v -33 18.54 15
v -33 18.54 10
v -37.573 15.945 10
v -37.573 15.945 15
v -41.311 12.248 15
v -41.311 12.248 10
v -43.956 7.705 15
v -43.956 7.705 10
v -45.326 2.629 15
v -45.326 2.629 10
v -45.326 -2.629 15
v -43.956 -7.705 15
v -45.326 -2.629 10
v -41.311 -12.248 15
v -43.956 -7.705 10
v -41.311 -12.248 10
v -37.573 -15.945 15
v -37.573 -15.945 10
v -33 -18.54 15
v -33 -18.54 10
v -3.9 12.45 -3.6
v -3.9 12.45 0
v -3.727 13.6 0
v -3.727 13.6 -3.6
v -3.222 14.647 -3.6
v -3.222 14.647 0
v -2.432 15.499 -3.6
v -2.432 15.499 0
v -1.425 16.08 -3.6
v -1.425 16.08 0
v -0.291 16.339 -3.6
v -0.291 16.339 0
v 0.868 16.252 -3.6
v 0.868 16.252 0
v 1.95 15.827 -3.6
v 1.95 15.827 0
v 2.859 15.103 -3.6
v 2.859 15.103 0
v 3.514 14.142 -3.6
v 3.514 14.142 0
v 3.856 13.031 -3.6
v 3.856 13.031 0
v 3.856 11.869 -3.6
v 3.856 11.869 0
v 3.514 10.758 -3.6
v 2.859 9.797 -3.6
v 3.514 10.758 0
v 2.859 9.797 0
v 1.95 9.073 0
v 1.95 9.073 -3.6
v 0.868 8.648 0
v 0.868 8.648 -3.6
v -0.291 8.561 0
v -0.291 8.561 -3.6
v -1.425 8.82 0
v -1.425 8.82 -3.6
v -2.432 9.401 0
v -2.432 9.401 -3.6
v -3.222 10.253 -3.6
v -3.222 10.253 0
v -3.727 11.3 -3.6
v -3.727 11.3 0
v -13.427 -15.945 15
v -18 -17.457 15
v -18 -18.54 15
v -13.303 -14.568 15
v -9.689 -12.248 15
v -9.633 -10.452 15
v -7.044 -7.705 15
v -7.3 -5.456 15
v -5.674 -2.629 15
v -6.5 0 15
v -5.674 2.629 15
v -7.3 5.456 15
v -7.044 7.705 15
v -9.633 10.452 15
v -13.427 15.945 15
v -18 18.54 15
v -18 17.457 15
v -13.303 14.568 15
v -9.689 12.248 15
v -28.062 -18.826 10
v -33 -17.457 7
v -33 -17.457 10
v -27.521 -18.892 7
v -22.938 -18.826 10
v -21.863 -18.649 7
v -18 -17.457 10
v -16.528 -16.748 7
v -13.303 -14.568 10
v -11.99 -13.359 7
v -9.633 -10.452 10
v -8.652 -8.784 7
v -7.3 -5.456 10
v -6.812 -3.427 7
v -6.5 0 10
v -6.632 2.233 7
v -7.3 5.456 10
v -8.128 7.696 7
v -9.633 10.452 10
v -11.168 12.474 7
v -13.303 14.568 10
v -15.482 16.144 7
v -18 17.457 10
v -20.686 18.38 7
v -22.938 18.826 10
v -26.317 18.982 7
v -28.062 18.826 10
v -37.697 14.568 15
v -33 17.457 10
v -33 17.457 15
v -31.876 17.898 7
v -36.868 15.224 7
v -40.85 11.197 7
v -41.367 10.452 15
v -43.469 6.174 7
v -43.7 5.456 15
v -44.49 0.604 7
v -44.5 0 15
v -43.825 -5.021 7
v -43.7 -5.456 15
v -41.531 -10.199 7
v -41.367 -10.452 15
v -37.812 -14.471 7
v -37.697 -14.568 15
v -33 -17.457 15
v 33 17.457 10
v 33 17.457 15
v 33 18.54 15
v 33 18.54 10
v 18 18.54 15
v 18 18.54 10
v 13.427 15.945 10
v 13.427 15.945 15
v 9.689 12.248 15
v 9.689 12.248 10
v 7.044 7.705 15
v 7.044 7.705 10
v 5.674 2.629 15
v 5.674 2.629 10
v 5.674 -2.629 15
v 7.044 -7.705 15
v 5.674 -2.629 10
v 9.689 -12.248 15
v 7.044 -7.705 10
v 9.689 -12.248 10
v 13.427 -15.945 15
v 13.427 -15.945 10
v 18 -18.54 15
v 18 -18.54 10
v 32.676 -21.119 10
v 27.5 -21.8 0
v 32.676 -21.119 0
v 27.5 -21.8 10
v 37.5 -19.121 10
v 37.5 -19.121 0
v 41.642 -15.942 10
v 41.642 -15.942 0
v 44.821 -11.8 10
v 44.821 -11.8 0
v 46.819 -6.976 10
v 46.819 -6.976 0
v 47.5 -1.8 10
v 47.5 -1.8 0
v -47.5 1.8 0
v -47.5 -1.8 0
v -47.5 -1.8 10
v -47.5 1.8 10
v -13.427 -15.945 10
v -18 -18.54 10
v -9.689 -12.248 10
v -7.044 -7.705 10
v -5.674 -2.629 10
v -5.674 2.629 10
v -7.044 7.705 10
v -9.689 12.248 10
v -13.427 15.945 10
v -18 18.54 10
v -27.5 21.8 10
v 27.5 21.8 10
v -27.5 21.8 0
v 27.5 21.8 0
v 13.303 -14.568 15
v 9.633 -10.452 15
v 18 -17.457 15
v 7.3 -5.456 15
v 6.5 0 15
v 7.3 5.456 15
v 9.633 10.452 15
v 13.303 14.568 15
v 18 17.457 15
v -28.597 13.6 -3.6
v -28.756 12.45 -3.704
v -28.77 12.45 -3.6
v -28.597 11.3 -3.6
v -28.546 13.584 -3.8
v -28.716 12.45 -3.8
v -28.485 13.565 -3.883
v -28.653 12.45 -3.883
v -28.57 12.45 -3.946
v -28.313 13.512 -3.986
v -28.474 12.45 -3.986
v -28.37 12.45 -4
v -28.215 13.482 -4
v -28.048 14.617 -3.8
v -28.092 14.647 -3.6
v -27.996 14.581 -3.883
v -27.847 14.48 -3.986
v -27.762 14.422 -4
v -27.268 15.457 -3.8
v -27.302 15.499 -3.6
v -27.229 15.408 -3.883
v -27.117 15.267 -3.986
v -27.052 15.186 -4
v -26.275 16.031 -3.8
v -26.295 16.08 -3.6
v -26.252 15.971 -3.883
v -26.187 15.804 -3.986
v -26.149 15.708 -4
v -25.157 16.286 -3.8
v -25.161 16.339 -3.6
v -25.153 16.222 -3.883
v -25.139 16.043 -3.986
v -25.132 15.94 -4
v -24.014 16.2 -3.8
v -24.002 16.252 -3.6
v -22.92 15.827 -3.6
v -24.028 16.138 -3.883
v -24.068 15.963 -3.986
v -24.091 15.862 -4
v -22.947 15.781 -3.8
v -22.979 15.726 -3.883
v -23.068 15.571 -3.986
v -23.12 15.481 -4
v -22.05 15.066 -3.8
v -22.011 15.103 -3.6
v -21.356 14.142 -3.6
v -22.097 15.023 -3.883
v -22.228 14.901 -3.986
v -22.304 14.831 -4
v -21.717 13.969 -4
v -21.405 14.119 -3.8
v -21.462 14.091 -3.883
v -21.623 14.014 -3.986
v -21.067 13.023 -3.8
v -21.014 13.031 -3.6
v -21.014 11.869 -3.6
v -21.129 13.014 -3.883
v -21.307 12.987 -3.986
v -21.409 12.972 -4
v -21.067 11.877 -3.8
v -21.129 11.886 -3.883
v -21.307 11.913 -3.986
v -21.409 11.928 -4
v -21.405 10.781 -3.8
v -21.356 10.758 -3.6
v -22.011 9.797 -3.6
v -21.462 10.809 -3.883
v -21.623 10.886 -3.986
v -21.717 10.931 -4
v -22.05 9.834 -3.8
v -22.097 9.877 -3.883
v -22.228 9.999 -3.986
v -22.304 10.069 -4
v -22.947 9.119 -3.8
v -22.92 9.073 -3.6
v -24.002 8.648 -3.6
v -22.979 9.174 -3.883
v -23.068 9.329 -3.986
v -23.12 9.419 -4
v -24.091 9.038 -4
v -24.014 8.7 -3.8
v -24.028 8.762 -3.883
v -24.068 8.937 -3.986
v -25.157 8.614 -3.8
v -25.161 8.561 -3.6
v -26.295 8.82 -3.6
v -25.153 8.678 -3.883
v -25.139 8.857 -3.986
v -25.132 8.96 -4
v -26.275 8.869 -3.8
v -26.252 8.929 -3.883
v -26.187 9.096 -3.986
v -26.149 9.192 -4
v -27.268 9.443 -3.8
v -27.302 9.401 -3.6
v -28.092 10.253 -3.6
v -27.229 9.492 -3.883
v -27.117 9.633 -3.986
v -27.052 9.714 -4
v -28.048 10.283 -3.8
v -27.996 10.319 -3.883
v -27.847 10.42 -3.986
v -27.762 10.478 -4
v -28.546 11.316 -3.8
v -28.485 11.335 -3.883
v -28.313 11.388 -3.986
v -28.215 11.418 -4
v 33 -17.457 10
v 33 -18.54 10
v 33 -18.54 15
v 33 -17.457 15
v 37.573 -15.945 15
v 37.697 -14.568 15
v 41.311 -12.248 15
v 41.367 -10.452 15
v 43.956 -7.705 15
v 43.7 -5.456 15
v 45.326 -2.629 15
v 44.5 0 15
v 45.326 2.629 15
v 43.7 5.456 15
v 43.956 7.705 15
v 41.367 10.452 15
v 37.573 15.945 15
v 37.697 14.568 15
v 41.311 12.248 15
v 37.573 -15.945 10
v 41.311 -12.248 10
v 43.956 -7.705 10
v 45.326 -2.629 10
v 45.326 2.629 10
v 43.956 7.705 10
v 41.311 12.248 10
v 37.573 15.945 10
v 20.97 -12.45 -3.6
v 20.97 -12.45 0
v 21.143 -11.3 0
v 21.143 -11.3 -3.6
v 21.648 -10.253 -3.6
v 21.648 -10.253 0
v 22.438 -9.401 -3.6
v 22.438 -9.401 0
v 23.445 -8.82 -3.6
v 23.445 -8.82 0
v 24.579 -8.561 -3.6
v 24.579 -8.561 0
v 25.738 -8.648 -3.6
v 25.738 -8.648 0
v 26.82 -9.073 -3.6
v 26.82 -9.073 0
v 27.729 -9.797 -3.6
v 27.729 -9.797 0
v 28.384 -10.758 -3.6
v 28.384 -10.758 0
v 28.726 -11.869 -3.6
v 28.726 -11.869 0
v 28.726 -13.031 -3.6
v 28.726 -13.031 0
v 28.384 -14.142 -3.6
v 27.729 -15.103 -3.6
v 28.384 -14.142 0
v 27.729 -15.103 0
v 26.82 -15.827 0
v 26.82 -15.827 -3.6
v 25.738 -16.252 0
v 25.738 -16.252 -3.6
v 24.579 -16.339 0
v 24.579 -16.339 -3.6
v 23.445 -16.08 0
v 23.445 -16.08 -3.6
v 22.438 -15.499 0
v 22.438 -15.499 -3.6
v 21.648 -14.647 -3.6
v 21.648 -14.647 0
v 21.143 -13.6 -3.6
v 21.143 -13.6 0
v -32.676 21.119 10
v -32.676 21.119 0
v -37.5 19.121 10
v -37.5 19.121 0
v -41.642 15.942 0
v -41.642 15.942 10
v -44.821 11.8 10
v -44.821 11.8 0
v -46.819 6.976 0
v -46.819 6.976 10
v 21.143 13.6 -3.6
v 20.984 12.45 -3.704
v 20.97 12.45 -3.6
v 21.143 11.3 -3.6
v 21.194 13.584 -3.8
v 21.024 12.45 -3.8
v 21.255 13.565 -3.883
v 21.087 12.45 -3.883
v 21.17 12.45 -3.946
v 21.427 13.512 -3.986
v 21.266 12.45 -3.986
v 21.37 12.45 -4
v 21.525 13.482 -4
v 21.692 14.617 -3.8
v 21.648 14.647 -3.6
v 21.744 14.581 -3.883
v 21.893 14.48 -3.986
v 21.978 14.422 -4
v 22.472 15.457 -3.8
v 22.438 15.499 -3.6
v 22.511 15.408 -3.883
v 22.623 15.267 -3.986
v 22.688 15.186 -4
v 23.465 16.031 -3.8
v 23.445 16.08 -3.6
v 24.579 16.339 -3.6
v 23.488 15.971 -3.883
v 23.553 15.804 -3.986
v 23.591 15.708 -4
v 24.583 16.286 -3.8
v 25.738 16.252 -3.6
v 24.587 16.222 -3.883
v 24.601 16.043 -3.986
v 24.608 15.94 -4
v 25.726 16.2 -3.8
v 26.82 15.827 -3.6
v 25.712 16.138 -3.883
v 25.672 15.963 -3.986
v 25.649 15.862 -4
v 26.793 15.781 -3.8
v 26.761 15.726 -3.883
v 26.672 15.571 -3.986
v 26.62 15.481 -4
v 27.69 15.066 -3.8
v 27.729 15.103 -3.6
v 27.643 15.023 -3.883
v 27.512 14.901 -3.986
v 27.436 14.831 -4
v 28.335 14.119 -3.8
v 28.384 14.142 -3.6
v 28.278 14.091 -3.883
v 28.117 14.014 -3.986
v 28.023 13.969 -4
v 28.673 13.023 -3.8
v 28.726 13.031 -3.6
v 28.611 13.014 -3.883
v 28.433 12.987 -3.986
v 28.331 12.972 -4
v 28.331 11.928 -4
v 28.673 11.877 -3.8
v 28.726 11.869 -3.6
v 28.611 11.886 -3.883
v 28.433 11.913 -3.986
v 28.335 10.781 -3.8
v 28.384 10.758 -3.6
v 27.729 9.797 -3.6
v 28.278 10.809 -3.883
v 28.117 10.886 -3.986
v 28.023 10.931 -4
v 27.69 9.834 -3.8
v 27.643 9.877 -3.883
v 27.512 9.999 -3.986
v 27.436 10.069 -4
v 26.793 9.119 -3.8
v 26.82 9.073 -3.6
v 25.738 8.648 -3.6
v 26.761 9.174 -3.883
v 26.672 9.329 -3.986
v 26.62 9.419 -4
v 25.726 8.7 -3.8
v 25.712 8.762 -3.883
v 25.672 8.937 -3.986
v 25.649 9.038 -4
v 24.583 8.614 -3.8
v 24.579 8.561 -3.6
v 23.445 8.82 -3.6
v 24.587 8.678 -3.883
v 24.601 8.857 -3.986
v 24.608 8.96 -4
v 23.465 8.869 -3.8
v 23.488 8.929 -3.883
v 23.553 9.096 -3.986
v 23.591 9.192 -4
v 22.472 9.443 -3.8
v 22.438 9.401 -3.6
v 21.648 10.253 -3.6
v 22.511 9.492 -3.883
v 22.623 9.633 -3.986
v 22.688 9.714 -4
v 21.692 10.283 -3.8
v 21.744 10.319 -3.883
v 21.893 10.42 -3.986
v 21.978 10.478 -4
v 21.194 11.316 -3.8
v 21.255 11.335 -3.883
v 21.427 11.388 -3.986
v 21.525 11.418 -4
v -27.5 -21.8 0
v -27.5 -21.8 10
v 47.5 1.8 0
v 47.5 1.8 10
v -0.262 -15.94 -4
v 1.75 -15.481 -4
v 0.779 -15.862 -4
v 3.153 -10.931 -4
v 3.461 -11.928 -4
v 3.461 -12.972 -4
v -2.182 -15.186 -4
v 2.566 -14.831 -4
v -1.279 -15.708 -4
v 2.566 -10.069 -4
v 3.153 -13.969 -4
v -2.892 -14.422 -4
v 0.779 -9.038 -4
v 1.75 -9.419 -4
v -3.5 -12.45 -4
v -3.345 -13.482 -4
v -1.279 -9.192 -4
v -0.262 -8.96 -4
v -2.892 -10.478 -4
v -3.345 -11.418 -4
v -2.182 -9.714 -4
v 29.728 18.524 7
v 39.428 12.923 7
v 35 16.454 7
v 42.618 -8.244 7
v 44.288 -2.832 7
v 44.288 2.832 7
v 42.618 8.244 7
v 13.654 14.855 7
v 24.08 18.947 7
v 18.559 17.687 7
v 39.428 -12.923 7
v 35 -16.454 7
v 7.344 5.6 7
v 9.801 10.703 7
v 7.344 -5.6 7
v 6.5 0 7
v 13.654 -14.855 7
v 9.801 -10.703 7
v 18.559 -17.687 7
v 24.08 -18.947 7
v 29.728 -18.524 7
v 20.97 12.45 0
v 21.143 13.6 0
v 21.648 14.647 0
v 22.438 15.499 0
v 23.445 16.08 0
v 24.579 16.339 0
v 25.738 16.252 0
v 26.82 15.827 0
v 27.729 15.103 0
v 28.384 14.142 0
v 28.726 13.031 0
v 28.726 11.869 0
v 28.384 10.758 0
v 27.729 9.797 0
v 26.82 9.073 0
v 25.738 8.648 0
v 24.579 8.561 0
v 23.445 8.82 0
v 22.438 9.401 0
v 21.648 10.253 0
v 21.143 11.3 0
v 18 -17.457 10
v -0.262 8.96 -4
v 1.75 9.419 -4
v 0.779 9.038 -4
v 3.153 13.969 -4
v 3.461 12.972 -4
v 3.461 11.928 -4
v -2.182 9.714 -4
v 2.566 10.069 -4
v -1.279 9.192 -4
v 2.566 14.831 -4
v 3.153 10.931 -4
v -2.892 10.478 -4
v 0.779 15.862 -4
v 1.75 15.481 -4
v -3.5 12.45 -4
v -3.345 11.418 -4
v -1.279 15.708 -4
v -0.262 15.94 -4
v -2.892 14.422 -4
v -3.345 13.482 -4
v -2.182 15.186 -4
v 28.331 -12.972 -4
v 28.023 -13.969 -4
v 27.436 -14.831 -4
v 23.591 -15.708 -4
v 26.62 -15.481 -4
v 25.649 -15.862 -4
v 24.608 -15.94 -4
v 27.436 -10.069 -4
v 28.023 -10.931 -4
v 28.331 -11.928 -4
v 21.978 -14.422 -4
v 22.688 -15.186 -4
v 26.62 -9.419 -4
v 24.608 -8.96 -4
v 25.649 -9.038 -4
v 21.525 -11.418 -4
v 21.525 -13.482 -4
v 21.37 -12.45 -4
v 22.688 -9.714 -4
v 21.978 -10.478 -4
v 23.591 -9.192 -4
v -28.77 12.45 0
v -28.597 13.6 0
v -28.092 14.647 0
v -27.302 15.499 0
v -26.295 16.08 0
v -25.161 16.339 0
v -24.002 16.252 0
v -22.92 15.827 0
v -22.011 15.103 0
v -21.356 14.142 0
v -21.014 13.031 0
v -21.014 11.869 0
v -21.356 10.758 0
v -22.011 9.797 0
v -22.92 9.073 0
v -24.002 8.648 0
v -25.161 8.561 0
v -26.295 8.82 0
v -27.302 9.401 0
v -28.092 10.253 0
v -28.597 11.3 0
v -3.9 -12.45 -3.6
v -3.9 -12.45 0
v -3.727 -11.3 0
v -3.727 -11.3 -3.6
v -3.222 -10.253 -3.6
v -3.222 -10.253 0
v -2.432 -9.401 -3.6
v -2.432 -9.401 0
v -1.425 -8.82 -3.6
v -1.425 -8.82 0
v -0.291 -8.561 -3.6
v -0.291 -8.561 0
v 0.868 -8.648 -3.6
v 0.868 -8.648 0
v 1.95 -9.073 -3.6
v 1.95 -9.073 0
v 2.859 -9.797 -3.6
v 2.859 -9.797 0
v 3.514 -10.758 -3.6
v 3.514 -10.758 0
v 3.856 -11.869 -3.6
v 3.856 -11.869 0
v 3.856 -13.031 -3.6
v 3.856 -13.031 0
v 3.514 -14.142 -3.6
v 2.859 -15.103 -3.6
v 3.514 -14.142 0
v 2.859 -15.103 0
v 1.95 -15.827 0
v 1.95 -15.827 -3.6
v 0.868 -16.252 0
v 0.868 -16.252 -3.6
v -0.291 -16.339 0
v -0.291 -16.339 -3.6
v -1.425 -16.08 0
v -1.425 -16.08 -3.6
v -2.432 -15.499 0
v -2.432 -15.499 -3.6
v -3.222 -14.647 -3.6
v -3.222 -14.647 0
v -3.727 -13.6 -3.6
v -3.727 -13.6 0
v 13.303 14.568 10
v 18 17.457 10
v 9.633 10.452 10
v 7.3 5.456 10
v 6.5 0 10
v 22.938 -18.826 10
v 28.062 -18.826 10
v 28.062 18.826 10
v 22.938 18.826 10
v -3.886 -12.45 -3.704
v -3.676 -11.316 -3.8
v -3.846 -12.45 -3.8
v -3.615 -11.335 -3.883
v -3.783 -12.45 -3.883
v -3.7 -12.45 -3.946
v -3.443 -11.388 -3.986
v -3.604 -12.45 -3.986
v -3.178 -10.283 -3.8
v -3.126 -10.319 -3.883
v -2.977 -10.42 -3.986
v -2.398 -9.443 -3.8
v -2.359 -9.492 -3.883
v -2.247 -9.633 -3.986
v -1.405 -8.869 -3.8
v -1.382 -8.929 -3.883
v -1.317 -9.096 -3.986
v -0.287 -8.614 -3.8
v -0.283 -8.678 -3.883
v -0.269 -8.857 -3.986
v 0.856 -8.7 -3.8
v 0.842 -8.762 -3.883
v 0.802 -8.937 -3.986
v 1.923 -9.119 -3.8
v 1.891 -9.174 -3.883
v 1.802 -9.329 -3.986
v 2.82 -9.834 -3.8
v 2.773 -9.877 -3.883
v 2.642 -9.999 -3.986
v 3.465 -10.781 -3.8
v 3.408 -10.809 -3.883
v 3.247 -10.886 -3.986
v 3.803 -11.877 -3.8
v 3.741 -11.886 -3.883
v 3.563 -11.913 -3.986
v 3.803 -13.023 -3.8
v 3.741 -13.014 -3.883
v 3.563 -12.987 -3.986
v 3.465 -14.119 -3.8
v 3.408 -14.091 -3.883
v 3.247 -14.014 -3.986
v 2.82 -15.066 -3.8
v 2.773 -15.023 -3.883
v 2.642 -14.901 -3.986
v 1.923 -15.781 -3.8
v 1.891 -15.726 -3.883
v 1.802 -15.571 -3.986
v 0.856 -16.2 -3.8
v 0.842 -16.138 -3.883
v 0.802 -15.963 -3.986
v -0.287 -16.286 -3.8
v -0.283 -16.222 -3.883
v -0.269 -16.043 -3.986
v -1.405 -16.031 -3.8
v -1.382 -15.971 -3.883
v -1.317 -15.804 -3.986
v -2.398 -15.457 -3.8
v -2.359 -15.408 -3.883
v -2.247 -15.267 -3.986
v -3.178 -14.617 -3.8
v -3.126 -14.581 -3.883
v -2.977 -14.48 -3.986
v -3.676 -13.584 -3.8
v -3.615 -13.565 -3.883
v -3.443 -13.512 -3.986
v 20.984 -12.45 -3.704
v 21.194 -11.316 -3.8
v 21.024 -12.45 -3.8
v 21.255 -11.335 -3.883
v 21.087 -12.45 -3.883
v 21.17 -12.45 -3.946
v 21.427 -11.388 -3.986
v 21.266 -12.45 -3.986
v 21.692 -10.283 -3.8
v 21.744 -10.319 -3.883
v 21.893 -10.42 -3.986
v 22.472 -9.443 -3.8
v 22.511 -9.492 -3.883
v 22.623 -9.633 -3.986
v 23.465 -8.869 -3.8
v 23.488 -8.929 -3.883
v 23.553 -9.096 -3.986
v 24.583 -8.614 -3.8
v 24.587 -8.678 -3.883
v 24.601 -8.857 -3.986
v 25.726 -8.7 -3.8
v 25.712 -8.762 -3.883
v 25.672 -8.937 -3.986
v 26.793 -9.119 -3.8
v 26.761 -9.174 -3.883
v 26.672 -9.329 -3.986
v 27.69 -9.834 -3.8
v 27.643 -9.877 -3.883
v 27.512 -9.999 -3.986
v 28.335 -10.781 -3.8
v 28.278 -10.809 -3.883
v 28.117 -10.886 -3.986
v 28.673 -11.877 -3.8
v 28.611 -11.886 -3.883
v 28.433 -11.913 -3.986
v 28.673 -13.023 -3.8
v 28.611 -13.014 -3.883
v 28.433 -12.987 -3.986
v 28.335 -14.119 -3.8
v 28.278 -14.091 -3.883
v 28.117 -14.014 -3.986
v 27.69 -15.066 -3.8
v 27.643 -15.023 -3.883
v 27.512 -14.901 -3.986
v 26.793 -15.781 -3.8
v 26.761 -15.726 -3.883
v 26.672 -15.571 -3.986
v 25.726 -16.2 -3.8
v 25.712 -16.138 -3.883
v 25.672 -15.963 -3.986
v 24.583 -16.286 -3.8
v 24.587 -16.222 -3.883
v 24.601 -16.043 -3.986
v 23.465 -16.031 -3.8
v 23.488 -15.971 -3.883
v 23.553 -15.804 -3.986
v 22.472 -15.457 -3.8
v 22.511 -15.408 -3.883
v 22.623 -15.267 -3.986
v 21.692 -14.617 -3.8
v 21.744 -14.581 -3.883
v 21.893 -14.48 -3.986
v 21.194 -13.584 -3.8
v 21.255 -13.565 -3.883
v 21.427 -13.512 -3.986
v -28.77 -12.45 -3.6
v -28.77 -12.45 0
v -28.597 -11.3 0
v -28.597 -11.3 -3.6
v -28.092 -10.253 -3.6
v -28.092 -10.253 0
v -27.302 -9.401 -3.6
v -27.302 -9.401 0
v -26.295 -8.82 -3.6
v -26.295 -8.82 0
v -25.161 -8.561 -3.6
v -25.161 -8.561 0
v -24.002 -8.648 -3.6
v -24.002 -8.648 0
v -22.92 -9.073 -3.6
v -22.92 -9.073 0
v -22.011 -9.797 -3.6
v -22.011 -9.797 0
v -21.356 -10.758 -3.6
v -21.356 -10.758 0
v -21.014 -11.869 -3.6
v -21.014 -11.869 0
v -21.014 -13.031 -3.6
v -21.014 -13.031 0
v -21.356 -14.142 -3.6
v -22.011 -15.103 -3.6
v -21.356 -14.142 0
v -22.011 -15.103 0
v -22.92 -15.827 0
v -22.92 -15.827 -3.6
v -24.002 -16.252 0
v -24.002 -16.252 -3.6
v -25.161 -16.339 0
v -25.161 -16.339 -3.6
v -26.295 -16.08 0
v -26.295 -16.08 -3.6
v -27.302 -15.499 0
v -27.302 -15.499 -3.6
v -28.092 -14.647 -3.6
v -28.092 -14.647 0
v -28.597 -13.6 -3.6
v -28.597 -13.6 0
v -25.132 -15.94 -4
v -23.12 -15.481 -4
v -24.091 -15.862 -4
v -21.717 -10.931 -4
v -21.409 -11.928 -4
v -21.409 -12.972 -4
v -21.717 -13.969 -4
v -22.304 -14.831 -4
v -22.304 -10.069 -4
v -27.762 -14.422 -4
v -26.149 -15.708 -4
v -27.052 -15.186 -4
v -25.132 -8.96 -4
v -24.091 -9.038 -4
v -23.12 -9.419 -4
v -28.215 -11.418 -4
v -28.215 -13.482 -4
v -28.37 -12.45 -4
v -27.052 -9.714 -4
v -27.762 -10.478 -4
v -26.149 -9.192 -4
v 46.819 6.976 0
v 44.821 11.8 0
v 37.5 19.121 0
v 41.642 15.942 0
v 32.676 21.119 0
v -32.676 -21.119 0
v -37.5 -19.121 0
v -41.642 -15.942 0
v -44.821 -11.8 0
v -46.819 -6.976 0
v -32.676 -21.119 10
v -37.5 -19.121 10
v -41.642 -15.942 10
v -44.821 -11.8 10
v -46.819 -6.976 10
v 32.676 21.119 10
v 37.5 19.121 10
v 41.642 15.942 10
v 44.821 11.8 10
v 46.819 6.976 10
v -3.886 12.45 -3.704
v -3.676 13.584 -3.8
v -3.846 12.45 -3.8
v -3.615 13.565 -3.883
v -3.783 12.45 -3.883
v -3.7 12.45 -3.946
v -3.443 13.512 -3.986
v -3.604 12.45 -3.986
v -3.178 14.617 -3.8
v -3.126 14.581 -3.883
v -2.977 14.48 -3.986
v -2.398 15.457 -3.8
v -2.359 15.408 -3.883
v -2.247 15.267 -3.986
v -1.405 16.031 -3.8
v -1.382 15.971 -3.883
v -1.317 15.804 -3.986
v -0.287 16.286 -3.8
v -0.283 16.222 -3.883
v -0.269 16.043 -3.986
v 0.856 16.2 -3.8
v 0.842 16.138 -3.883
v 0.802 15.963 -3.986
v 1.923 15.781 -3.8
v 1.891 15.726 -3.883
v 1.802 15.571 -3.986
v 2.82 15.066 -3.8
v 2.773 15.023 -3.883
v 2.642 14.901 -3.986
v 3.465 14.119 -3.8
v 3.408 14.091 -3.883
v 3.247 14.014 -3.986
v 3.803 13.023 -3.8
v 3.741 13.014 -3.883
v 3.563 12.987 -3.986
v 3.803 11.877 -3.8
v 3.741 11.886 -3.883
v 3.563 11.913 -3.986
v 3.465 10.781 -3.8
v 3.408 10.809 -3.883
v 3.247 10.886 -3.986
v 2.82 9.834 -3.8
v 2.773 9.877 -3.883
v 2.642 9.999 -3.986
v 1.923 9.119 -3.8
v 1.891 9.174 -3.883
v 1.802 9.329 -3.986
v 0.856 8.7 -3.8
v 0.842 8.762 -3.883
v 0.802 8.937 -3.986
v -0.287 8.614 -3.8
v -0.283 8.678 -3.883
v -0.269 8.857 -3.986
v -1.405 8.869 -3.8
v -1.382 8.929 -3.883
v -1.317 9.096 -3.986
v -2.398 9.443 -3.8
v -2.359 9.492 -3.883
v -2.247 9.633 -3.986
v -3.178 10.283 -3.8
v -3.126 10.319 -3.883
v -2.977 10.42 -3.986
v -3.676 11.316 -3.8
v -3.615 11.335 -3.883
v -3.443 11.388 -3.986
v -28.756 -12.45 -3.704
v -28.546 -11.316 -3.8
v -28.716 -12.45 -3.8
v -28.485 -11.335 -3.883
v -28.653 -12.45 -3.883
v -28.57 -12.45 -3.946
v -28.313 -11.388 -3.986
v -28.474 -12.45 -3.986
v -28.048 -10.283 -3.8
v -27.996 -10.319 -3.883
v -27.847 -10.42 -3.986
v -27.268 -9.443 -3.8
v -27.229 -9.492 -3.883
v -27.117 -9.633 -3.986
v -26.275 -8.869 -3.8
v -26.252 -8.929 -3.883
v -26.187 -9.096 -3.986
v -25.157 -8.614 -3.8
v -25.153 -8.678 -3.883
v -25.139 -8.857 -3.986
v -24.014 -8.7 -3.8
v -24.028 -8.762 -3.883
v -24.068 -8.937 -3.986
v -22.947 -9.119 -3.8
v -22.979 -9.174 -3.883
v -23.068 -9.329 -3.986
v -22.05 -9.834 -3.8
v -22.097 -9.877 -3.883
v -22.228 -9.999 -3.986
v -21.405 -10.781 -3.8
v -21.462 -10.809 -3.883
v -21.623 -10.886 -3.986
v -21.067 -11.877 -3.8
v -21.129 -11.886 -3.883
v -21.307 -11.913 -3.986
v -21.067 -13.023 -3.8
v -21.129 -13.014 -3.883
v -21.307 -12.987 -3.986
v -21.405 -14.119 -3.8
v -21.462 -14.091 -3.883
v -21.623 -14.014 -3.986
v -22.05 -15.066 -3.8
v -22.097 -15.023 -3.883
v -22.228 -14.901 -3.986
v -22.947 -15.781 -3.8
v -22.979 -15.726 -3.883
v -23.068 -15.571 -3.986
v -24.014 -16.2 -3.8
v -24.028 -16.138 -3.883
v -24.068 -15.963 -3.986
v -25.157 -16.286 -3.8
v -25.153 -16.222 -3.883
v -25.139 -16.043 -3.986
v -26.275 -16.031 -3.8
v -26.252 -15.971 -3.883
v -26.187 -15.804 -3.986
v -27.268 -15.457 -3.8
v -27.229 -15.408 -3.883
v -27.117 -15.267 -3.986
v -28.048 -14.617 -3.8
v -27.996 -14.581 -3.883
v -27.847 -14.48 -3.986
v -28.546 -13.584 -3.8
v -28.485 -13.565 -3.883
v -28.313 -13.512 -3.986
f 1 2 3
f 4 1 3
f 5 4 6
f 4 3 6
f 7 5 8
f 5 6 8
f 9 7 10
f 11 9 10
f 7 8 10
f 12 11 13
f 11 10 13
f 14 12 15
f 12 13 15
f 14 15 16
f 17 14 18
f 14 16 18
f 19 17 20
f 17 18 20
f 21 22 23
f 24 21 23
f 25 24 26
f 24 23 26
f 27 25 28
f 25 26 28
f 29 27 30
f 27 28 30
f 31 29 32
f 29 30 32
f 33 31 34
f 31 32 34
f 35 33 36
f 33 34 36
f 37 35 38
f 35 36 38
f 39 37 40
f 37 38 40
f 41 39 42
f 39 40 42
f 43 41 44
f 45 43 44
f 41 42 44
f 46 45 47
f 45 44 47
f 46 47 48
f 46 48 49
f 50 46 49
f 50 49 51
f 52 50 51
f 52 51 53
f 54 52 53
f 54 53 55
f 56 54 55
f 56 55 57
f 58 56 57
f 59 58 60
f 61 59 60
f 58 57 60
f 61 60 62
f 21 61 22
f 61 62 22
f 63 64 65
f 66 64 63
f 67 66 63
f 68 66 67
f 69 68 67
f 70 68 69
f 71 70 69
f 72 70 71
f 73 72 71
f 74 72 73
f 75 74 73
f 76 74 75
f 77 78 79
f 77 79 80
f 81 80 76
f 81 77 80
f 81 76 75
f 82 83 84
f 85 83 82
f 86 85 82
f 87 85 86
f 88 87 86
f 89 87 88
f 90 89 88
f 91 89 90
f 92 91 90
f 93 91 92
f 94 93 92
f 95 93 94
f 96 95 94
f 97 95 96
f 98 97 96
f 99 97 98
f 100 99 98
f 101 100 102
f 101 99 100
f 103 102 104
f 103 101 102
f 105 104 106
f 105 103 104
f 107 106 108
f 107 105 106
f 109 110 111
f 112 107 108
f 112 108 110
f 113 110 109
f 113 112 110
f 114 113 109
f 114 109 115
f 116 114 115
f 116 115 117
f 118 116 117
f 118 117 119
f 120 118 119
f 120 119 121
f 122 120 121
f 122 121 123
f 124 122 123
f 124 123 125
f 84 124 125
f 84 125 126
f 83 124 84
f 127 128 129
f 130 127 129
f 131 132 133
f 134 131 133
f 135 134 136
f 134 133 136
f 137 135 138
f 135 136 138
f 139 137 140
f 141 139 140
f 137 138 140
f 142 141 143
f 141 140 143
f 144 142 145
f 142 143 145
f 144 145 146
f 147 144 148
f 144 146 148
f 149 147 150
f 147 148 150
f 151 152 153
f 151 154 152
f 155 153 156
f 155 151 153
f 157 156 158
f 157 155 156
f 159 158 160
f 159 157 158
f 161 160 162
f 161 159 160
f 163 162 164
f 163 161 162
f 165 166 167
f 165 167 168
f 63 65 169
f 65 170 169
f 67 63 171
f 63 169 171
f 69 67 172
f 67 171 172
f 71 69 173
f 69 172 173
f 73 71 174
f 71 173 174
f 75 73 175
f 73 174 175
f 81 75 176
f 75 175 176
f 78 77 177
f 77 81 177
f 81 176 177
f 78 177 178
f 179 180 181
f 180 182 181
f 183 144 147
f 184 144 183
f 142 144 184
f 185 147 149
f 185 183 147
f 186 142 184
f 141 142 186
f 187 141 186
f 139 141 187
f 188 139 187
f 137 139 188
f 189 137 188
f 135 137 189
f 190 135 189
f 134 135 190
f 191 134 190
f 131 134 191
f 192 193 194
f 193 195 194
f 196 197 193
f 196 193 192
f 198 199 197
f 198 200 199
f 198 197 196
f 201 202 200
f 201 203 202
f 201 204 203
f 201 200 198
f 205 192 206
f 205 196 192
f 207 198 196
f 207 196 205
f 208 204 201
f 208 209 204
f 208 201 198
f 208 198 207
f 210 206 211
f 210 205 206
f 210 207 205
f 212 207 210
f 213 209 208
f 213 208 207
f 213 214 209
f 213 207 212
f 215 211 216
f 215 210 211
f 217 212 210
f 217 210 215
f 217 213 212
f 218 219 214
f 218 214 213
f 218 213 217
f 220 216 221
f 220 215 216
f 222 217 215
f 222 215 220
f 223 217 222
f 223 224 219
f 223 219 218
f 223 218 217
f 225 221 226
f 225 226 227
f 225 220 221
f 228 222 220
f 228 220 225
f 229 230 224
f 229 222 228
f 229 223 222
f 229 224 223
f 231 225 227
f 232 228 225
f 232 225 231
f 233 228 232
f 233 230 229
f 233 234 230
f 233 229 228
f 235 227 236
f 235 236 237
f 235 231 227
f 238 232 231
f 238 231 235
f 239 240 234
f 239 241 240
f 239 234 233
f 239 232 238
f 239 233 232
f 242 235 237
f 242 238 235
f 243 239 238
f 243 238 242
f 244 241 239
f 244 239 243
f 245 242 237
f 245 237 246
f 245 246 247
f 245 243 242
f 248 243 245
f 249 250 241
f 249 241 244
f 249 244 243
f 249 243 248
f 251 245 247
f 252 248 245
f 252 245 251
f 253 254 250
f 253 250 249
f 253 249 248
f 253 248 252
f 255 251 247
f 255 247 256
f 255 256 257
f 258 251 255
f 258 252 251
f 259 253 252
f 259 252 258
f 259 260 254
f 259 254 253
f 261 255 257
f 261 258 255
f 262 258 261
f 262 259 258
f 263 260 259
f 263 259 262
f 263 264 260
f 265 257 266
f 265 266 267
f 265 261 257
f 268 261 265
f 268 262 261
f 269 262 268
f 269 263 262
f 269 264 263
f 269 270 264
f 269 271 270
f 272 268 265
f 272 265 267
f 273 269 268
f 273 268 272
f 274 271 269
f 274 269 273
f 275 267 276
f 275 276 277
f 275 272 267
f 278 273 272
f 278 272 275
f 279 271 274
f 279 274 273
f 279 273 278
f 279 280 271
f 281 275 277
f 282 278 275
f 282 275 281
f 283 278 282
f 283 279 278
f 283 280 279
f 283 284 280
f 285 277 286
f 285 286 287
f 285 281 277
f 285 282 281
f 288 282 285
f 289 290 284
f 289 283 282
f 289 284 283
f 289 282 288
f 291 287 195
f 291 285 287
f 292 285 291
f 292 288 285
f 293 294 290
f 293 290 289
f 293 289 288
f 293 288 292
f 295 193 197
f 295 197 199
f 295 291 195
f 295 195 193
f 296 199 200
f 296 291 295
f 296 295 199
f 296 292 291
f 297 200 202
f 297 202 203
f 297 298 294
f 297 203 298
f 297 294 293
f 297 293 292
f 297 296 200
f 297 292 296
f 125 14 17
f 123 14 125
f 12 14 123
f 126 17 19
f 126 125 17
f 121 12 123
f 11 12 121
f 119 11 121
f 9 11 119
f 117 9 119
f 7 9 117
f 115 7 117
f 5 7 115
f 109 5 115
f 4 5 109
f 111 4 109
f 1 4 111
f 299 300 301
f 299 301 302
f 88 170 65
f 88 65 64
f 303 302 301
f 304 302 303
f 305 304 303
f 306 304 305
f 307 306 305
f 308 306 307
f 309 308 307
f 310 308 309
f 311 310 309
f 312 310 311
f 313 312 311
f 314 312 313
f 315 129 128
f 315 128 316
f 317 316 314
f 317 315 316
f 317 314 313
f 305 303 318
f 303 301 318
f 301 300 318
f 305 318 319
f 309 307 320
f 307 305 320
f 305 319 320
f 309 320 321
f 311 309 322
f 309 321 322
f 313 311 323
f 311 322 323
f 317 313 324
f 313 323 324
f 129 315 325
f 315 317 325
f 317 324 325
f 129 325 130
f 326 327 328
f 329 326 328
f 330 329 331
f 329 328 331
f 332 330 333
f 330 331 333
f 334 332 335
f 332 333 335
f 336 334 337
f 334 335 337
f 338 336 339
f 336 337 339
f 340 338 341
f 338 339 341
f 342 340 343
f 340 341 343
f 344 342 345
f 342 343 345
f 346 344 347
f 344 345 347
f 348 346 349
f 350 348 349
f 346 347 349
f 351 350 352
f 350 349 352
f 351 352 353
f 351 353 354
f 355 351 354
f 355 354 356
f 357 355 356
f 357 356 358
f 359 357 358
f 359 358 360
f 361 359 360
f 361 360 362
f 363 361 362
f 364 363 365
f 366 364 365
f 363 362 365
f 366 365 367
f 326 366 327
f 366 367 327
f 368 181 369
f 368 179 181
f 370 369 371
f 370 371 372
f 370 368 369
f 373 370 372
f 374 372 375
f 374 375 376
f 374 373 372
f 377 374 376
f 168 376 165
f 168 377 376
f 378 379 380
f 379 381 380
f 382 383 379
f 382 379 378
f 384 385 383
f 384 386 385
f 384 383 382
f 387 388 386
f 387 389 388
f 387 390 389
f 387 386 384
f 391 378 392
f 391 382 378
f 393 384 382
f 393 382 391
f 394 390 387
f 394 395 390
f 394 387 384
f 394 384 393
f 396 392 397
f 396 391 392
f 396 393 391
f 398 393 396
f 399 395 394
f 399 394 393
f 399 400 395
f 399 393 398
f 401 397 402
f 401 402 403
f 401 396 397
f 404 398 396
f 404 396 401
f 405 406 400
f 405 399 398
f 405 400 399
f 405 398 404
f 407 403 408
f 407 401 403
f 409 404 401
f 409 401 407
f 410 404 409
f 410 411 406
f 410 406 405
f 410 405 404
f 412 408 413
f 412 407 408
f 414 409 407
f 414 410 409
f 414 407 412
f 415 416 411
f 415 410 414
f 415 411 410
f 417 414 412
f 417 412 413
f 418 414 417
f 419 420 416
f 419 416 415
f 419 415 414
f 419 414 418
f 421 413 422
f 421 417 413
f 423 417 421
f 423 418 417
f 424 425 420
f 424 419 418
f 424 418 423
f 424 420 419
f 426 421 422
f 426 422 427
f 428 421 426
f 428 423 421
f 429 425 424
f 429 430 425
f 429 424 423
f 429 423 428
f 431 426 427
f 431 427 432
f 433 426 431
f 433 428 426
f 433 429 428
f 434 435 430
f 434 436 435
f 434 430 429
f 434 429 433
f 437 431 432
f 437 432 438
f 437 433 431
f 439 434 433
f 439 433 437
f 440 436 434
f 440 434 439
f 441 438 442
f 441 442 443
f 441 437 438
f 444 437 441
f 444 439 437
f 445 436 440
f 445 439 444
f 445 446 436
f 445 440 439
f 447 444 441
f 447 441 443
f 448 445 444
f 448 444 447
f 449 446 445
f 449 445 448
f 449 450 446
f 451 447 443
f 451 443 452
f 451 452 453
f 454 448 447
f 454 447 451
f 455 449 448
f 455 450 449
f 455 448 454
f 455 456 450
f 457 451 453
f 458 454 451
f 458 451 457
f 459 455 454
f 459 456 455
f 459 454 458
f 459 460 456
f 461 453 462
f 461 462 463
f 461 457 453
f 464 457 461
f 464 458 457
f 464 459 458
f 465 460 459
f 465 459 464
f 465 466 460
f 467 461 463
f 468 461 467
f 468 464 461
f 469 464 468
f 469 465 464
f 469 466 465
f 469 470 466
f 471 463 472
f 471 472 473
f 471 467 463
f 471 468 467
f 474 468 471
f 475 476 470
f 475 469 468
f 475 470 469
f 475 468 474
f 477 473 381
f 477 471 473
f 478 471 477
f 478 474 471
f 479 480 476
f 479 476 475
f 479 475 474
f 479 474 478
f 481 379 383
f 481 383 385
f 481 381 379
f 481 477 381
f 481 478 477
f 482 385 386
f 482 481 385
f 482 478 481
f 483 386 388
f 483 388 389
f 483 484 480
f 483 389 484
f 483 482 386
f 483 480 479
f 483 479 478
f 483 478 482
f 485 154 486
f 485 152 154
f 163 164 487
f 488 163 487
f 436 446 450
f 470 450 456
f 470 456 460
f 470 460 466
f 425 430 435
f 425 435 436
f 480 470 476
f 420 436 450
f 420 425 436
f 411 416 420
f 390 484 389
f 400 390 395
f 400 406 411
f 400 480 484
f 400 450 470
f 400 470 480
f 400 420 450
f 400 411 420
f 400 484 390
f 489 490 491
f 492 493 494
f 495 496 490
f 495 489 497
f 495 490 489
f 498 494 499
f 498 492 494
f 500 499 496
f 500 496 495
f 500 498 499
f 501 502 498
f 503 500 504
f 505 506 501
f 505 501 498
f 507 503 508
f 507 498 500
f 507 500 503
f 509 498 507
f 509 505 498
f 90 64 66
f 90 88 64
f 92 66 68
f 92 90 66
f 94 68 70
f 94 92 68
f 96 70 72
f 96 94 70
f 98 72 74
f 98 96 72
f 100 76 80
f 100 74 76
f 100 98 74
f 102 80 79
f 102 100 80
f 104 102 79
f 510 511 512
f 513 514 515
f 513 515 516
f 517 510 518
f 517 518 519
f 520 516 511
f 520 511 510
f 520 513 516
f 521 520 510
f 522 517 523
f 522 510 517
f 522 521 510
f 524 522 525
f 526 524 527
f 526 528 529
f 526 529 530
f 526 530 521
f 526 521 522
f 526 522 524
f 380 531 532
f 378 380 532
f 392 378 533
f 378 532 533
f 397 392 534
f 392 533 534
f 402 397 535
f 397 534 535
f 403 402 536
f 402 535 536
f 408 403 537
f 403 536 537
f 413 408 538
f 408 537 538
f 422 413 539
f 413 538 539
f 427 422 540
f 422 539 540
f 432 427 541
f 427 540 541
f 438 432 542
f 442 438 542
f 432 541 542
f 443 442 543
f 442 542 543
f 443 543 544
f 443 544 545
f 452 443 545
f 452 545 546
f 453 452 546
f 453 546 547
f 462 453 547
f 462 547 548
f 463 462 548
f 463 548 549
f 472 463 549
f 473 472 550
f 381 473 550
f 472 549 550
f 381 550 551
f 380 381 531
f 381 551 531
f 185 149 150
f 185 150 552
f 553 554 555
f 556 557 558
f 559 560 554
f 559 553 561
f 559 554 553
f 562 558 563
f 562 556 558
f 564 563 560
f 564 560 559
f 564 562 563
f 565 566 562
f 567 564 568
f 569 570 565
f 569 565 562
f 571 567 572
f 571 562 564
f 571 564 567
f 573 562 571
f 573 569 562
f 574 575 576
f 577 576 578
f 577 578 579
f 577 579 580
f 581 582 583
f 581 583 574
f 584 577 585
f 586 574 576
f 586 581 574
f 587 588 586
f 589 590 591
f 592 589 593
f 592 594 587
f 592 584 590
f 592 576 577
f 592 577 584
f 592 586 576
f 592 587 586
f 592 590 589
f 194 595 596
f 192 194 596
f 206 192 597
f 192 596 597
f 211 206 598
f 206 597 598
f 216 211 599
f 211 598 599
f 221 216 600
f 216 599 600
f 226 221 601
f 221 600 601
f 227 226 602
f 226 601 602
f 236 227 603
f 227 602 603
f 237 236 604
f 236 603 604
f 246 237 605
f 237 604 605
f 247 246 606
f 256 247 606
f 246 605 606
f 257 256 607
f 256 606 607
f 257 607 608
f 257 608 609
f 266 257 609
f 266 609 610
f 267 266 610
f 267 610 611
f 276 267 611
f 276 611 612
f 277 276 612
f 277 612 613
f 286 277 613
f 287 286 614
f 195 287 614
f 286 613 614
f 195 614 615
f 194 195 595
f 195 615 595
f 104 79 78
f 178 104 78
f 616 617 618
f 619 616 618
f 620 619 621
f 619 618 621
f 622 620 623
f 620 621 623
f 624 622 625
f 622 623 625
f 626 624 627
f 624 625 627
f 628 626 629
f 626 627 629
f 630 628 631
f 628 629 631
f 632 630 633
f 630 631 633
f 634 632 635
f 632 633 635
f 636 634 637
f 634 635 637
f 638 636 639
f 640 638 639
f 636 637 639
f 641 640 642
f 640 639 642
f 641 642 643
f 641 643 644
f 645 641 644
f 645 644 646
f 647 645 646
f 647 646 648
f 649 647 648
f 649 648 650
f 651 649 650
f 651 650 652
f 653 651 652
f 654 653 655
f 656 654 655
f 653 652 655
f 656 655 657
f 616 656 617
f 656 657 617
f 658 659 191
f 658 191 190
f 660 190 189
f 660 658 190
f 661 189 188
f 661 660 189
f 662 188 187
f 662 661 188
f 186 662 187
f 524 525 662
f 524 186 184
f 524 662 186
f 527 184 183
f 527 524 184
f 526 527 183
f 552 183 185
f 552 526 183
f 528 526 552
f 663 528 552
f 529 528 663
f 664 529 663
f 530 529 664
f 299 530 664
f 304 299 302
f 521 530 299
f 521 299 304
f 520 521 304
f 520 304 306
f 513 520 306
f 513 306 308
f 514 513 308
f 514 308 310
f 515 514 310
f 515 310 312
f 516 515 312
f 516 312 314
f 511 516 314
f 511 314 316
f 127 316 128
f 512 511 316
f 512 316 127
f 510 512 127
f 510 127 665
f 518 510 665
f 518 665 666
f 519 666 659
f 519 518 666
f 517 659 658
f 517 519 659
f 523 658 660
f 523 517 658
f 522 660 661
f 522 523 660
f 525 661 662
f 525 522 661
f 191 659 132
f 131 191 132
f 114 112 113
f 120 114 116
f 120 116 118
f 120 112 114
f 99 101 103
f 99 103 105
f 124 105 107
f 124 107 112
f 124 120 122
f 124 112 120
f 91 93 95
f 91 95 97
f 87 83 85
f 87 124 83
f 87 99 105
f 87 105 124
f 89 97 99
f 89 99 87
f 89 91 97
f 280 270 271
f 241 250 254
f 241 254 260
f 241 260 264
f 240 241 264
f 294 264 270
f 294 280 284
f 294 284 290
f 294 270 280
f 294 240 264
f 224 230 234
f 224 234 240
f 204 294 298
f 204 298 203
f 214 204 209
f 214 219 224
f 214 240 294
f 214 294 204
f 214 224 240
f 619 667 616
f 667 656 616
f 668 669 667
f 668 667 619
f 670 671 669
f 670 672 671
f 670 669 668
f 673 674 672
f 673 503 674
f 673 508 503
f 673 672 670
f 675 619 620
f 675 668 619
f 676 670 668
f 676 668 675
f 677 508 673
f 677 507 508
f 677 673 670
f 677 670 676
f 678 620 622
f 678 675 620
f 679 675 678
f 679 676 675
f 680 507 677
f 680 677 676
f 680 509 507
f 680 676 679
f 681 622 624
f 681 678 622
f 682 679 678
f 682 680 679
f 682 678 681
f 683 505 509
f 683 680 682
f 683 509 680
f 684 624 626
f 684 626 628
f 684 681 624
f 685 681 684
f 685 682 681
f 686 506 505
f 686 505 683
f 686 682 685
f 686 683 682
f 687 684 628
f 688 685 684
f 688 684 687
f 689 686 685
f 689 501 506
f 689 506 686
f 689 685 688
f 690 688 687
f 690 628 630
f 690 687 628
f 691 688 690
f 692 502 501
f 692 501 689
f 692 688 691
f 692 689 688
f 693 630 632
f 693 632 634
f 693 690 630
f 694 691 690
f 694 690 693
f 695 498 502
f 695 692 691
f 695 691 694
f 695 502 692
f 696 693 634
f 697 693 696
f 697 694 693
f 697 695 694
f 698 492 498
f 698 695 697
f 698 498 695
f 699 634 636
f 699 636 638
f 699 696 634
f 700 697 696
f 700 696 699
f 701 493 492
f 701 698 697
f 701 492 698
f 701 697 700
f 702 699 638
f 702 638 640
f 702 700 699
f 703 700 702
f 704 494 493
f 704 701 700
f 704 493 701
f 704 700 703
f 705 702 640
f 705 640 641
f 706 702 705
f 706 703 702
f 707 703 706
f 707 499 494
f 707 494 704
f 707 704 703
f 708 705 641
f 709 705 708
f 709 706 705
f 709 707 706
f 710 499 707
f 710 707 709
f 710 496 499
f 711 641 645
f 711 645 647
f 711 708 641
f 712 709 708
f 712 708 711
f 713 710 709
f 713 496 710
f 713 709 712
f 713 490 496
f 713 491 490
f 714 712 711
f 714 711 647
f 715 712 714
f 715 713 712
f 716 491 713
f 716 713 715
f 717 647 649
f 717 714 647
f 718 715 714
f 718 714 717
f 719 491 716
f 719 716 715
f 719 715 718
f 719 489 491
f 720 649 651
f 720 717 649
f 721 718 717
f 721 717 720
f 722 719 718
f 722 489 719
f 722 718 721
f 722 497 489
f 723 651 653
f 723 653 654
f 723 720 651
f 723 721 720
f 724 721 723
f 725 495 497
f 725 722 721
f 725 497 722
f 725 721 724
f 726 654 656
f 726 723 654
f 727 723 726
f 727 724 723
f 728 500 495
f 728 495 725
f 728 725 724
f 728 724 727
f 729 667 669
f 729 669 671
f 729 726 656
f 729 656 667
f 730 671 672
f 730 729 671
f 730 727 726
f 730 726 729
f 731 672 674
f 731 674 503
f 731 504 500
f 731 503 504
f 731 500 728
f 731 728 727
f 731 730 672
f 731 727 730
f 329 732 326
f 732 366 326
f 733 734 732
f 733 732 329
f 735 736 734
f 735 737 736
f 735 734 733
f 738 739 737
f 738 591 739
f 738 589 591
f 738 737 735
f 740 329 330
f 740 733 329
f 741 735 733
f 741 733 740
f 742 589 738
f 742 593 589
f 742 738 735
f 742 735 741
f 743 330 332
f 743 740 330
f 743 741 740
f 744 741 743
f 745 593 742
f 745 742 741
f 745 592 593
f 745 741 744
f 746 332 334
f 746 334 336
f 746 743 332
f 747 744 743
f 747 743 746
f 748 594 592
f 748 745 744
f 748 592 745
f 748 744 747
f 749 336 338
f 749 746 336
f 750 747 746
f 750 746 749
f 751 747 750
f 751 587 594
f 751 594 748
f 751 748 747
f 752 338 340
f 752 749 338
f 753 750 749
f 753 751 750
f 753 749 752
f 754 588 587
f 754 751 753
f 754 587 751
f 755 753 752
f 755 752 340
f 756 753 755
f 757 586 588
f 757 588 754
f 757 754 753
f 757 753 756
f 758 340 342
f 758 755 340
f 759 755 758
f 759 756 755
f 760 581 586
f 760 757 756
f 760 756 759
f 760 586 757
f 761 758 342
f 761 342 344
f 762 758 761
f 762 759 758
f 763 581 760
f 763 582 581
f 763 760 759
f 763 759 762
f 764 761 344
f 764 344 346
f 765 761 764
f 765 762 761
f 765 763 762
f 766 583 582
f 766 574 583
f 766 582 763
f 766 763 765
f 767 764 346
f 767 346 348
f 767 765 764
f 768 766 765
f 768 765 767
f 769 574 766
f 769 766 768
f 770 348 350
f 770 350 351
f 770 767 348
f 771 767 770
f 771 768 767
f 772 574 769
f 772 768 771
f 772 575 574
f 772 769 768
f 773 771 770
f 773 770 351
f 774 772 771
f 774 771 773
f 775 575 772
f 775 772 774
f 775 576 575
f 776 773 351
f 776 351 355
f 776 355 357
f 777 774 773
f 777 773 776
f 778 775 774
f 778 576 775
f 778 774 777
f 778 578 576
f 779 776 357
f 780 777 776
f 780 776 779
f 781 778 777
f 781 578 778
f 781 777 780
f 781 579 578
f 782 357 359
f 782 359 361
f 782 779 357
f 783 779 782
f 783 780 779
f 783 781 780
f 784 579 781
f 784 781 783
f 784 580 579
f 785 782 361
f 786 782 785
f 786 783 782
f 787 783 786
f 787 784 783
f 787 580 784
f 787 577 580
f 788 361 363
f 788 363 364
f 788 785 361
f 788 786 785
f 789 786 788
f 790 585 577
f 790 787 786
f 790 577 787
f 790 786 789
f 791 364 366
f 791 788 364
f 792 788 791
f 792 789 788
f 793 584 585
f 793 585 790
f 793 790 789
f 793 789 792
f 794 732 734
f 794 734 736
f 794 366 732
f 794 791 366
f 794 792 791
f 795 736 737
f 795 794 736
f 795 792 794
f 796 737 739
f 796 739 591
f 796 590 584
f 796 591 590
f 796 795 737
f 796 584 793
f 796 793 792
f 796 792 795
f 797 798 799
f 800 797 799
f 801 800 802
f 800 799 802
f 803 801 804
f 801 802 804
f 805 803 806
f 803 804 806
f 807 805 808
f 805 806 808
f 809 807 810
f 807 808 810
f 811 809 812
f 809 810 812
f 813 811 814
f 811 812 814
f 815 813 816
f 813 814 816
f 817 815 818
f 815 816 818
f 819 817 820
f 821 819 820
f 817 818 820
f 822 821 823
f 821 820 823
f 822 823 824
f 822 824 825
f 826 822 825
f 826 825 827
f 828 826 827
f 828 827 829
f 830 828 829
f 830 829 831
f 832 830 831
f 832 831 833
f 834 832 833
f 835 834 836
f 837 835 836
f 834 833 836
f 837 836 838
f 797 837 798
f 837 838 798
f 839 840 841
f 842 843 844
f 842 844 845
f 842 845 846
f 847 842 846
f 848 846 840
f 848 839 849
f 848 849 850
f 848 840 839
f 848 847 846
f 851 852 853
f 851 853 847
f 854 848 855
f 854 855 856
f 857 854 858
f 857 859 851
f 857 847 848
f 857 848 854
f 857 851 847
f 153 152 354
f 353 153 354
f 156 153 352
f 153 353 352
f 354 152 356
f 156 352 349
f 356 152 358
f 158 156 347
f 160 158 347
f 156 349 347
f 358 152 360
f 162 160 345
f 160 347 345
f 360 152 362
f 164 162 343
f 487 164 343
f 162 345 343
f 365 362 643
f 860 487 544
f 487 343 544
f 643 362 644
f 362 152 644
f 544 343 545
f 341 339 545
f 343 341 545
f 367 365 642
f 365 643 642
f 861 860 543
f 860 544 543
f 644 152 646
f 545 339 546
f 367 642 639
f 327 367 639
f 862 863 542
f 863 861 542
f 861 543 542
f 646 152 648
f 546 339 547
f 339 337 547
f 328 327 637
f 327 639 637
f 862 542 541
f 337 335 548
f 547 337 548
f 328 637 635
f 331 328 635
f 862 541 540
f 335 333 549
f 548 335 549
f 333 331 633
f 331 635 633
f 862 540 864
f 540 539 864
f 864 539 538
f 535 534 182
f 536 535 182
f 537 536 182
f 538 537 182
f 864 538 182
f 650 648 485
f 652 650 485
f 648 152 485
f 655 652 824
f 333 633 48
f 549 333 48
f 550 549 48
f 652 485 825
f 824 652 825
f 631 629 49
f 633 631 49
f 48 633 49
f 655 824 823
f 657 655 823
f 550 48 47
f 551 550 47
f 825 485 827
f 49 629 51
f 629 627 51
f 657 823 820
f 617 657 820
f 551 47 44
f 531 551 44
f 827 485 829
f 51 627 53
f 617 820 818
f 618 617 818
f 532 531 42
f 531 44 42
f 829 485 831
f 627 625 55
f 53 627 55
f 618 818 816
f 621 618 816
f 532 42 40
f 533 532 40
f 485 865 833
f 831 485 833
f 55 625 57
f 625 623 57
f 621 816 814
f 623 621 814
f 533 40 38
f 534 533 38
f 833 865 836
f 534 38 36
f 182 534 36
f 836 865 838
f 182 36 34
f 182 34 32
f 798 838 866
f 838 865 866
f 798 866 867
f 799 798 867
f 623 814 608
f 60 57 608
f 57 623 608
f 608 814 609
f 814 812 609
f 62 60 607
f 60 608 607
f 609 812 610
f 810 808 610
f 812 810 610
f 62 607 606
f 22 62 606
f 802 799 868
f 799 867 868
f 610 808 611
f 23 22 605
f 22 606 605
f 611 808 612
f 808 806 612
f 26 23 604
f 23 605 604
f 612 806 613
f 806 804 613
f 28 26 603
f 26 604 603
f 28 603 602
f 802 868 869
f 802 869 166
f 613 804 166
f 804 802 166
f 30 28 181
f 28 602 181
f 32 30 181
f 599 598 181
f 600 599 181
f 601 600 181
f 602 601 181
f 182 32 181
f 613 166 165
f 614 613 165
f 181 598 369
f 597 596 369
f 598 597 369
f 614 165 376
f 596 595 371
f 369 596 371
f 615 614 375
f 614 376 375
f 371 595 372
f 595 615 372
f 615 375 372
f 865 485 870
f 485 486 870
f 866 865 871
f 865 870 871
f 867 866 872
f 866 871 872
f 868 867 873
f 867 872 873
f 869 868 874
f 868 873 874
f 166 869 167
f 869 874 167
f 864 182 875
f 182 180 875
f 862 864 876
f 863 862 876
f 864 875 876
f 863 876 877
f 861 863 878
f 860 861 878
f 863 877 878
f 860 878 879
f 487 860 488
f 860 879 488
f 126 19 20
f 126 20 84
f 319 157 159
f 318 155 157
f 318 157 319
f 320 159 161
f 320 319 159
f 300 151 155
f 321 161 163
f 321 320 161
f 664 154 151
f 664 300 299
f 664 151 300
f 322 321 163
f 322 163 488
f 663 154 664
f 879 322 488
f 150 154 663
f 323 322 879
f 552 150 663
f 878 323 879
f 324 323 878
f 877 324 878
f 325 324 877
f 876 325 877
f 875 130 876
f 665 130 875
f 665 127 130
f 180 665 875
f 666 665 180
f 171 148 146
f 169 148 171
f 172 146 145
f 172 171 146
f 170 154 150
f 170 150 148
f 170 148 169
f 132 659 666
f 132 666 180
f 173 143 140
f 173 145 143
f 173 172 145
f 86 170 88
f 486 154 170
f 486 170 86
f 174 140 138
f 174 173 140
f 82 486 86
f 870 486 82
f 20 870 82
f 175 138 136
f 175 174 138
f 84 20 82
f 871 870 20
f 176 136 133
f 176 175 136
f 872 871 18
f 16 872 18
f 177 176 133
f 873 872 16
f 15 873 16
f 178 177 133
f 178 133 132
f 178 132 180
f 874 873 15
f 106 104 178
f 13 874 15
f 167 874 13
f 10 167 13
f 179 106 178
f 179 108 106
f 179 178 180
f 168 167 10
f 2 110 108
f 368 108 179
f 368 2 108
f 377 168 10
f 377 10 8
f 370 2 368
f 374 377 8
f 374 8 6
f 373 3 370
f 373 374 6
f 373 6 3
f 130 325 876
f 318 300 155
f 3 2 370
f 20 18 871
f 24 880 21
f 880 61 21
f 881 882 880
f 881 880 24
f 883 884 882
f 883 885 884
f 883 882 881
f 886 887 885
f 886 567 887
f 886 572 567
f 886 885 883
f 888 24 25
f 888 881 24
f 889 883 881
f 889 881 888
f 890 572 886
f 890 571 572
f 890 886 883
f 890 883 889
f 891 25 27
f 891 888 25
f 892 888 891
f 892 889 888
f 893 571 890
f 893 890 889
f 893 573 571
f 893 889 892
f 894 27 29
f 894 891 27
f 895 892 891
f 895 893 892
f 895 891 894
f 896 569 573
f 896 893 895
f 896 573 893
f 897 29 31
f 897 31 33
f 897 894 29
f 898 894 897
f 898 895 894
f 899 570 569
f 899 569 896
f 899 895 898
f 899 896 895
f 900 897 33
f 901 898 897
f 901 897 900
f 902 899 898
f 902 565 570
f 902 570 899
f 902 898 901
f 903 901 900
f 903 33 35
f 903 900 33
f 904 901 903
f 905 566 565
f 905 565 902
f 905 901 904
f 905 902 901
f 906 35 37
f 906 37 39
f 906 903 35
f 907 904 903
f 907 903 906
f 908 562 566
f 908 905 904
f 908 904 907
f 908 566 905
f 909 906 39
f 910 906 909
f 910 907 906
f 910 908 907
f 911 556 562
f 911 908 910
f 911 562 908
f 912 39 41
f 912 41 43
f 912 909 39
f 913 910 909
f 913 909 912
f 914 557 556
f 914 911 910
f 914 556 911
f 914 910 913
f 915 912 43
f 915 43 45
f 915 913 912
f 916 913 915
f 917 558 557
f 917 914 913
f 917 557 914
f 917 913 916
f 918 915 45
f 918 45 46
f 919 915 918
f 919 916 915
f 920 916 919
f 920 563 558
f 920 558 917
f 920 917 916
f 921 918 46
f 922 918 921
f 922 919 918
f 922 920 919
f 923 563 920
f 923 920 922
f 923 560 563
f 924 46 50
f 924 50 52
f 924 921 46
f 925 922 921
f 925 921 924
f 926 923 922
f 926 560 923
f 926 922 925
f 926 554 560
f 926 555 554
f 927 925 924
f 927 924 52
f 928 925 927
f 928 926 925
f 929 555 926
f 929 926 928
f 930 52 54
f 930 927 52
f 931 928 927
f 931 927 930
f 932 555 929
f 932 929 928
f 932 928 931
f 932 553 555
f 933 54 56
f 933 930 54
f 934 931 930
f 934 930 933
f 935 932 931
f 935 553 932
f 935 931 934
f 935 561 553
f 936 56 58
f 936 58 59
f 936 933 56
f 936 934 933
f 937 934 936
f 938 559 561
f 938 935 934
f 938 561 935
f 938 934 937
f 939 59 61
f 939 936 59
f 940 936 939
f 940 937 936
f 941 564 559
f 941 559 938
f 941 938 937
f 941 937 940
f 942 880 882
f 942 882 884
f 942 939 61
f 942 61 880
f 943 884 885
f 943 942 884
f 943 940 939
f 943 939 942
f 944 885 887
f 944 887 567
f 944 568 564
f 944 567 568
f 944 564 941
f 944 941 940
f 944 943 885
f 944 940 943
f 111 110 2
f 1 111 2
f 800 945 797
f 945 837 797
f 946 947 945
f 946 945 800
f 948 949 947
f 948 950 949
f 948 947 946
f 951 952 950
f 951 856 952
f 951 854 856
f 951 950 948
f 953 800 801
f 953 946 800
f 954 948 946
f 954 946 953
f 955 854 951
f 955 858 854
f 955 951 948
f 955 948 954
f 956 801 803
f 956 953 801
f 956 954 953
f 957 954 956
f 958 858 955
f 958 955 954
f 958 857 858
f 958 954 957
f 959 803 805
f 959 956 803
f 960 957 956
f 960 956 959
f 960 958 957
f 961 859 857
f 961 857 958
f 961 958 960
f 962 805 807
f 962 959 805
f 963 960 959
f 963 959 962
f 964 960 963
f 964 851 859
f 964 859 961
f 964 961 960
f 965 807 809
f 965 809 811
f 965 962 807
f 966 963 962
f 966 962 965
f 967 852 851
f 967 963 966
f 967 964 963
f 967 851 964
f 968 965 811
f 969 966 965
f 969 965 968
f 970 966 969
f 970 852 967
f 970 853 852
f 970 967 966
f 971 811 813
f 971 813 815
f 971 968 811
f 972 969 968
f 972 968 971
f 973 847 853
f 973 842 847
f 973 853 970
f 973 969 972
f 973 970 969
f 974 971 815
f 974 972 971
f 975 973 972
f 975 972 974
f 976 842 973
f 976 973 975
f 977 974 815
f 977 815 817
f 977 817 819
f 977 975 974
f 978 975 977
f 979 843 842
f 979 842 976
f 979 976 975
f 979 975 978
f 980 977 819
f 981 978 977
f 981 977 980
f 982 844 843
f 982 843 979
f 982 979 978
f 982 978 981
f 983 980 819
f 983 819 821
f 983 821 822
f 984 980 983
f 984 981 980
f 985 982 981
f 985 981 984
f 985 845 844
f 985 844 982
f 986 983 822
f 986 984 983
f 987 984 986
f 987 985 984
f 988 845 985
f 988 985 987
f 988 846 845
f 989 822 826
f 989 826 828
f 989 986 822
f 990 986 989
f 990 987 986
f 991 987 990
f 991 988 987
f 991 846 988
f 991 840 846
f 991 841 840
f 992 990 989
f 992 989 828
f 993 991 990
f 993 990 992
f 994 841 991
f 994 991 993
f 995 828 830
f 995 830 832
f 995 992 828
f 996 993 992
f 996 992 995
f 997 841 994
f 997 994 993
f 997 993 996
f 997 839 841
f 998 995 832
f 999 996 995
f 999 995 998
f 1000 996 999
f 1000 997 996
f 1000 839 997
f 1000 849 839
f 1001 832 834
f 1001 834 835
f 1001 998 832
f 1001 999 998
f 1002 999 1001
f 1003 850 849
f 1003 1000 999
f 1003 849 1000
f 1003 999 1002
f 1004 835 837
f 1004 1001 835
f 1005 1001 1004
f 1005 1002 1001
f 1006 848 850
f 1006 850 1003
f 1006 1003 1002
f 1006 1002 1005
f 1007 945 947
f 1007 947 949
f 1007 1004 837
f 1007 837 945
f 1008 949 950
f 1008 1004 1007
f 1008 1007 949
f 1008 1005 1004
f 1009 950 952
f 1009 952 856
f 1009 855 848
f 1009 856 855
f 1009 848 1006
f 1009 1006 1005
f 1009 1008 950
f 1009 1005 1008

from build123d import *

# Parameters (mm, degrees)
SKETCH1_W           = 43.6
SKETCH1_H           = 95
BOSS_EXTRUDE1_DEPTH = 10
SKETCH2_R           = 3.9
BOSS_EXTRUDE2_DEPTH = 4
SKETCH5_R           = 20
SKETCH5_R_2         = 19
BOSS_EXTRUDE4_DEPTH = 5
SKETCH6_W           = 15
SKETCH6_H           = 43.6
CUT_EXTRUDE1_DEPTH  = 5
FILLET1_R           = 20
CUT_EXTRUDE2_START  = -3
SKETCH7_R           = 19
CUT_EXTRUDE2_DEPTH  = 3
LPATTERN1_COUNT     = 2
LPATTERN1_PITCH     = 24.87
LPATTERN1_COL_COUNT = 2
LPATTERN1_COL_PITCH = 24.87
FILLET3_R           = 0.4


with BuildPart() as part:
    # Sketch1 → Boss-Extrude1 (new body)
    with BuildSketch(Plane(origin=(0, 0, 0), x_dir=(0, 1, 0), z_dir=(0, 0, 1))):
        Rectangle(SKETCH1_W, SKETCH1_H)
    extrude(amount=BOSS_EXTRUDE1_DEPTH)

    # Sketch2 → Boss-Extrude2 (add)
    with BuildSketch(Plane(origin=(0, 0, 0), x_dir=(1, 0, 0), z_dir=(0, 0, -1))):
        with Locations(Location((0, 12.45, 0), (0, 0, 180))):
            Circle(SKETCH2_R)
        with Locations(Location((0, -12.45, 0), (0, 0, 180))):
            Circle(SKETCH2_R)
    boss_extrude2 = extrude(amount=BOSS_EXTRUDE2_DEPTH)

    # Sketch5 → Boss-Extrude4 (add)
    # profile 1 of 2: a face of its own
    with BuildSketch(Plane.XY.offset(10)):
        with Locations((-25.5, 0)):
            Circle(SKETCH5_R)
        with Locations((-25.5, 0)):
            Circle(SKETCH5_R_2, mode=Mode.SUBTRACT)
    # profile 2 of 2: a face of its own
    with BuildSketch(Plane.XY.offset(10)):
        with Locations((25.5, 0)):
            Circle(SKETCH5_R)
        with Locations((25.5, 0)):
            Circle(SKETCH5_R_2, mode=Mode.SUBTRACT)
    extrude(amount=BOSS_EXTRUDE4_DEPTH)

    # Sketch6 → Cut-Extrude1 (cut)
    with BuildSketch(Plane.XY.offset(15)):
        with Locations((-25.5, 0)):
            Rectangle(SKETCH6_W, SKETCH6_H)
        with Locations((25.5, 0)):
            Rectangle(SKETCH6_W, SKETCH6_H)
    extrude(amount=-CUT_EXTRUDE1_DEPTH, mode=Mode.SUBTRACT)

    # Fillet1
    fillet1_edges = [part.edges().sort_by_distance(p)[0] for p in [
        (47.5, 21.8, 5),
        (47.5, -21.8, 5),
        (-47.5, -21.8, 5),
        (-47.5, 21.8, 5),
    ]]
    fillet(fillet1_edges, radius=FILLET1_R)

    # Sketch7 → Cut-Extrude2 (cut)
    with BuildSketch(Plane.XY.offset(10).offset(CUT_EXTRUDE2_START)):
        with Locations(Location((-25.5, 0, 0), (0, 0, 246.750437409))):
            Circle(SKETCH7_R)
        with Locations(Location((25.5, 0, 0), (0, 0, 180))):
            Circle(SKETCH7_R)
    extrude(amount=CUT_EXTRUDE2_DEPTH, mode=Mode.SUBTRACT)

    # LPattern1: Boss-Extrude2 ×2
    with Locations(*[(-i * LPATTERN1_PITCH, 0, 0) for i in range(1, LPATTERN1_COUNT)]):
        add(boss_extrude2)

    # LPattern1 col: Boss-Extrude2 ×2
    with Locations(*[(i * LPATTERN1_COL_PITCH, 0, 0) for i in range(1, LPATTERN1_COL_COUNT)]):
        add(boss_extrude2)

    # Fillet3
    fillet3_edges = [part.edges().sort_by_distance(p)[0] for p in [
        (3.9, -12.45, -4),
        (28.77, 12.45, -4),
        (-20.97, -12.45, -4),
        (-20.97, 12.45, -4),
        (28.77, -12.45, -4),
        (3.9, 12.45, -4),
    ]]
    fillet(fillet3_edges, radius=FILLET3_R)


solid = part.part
